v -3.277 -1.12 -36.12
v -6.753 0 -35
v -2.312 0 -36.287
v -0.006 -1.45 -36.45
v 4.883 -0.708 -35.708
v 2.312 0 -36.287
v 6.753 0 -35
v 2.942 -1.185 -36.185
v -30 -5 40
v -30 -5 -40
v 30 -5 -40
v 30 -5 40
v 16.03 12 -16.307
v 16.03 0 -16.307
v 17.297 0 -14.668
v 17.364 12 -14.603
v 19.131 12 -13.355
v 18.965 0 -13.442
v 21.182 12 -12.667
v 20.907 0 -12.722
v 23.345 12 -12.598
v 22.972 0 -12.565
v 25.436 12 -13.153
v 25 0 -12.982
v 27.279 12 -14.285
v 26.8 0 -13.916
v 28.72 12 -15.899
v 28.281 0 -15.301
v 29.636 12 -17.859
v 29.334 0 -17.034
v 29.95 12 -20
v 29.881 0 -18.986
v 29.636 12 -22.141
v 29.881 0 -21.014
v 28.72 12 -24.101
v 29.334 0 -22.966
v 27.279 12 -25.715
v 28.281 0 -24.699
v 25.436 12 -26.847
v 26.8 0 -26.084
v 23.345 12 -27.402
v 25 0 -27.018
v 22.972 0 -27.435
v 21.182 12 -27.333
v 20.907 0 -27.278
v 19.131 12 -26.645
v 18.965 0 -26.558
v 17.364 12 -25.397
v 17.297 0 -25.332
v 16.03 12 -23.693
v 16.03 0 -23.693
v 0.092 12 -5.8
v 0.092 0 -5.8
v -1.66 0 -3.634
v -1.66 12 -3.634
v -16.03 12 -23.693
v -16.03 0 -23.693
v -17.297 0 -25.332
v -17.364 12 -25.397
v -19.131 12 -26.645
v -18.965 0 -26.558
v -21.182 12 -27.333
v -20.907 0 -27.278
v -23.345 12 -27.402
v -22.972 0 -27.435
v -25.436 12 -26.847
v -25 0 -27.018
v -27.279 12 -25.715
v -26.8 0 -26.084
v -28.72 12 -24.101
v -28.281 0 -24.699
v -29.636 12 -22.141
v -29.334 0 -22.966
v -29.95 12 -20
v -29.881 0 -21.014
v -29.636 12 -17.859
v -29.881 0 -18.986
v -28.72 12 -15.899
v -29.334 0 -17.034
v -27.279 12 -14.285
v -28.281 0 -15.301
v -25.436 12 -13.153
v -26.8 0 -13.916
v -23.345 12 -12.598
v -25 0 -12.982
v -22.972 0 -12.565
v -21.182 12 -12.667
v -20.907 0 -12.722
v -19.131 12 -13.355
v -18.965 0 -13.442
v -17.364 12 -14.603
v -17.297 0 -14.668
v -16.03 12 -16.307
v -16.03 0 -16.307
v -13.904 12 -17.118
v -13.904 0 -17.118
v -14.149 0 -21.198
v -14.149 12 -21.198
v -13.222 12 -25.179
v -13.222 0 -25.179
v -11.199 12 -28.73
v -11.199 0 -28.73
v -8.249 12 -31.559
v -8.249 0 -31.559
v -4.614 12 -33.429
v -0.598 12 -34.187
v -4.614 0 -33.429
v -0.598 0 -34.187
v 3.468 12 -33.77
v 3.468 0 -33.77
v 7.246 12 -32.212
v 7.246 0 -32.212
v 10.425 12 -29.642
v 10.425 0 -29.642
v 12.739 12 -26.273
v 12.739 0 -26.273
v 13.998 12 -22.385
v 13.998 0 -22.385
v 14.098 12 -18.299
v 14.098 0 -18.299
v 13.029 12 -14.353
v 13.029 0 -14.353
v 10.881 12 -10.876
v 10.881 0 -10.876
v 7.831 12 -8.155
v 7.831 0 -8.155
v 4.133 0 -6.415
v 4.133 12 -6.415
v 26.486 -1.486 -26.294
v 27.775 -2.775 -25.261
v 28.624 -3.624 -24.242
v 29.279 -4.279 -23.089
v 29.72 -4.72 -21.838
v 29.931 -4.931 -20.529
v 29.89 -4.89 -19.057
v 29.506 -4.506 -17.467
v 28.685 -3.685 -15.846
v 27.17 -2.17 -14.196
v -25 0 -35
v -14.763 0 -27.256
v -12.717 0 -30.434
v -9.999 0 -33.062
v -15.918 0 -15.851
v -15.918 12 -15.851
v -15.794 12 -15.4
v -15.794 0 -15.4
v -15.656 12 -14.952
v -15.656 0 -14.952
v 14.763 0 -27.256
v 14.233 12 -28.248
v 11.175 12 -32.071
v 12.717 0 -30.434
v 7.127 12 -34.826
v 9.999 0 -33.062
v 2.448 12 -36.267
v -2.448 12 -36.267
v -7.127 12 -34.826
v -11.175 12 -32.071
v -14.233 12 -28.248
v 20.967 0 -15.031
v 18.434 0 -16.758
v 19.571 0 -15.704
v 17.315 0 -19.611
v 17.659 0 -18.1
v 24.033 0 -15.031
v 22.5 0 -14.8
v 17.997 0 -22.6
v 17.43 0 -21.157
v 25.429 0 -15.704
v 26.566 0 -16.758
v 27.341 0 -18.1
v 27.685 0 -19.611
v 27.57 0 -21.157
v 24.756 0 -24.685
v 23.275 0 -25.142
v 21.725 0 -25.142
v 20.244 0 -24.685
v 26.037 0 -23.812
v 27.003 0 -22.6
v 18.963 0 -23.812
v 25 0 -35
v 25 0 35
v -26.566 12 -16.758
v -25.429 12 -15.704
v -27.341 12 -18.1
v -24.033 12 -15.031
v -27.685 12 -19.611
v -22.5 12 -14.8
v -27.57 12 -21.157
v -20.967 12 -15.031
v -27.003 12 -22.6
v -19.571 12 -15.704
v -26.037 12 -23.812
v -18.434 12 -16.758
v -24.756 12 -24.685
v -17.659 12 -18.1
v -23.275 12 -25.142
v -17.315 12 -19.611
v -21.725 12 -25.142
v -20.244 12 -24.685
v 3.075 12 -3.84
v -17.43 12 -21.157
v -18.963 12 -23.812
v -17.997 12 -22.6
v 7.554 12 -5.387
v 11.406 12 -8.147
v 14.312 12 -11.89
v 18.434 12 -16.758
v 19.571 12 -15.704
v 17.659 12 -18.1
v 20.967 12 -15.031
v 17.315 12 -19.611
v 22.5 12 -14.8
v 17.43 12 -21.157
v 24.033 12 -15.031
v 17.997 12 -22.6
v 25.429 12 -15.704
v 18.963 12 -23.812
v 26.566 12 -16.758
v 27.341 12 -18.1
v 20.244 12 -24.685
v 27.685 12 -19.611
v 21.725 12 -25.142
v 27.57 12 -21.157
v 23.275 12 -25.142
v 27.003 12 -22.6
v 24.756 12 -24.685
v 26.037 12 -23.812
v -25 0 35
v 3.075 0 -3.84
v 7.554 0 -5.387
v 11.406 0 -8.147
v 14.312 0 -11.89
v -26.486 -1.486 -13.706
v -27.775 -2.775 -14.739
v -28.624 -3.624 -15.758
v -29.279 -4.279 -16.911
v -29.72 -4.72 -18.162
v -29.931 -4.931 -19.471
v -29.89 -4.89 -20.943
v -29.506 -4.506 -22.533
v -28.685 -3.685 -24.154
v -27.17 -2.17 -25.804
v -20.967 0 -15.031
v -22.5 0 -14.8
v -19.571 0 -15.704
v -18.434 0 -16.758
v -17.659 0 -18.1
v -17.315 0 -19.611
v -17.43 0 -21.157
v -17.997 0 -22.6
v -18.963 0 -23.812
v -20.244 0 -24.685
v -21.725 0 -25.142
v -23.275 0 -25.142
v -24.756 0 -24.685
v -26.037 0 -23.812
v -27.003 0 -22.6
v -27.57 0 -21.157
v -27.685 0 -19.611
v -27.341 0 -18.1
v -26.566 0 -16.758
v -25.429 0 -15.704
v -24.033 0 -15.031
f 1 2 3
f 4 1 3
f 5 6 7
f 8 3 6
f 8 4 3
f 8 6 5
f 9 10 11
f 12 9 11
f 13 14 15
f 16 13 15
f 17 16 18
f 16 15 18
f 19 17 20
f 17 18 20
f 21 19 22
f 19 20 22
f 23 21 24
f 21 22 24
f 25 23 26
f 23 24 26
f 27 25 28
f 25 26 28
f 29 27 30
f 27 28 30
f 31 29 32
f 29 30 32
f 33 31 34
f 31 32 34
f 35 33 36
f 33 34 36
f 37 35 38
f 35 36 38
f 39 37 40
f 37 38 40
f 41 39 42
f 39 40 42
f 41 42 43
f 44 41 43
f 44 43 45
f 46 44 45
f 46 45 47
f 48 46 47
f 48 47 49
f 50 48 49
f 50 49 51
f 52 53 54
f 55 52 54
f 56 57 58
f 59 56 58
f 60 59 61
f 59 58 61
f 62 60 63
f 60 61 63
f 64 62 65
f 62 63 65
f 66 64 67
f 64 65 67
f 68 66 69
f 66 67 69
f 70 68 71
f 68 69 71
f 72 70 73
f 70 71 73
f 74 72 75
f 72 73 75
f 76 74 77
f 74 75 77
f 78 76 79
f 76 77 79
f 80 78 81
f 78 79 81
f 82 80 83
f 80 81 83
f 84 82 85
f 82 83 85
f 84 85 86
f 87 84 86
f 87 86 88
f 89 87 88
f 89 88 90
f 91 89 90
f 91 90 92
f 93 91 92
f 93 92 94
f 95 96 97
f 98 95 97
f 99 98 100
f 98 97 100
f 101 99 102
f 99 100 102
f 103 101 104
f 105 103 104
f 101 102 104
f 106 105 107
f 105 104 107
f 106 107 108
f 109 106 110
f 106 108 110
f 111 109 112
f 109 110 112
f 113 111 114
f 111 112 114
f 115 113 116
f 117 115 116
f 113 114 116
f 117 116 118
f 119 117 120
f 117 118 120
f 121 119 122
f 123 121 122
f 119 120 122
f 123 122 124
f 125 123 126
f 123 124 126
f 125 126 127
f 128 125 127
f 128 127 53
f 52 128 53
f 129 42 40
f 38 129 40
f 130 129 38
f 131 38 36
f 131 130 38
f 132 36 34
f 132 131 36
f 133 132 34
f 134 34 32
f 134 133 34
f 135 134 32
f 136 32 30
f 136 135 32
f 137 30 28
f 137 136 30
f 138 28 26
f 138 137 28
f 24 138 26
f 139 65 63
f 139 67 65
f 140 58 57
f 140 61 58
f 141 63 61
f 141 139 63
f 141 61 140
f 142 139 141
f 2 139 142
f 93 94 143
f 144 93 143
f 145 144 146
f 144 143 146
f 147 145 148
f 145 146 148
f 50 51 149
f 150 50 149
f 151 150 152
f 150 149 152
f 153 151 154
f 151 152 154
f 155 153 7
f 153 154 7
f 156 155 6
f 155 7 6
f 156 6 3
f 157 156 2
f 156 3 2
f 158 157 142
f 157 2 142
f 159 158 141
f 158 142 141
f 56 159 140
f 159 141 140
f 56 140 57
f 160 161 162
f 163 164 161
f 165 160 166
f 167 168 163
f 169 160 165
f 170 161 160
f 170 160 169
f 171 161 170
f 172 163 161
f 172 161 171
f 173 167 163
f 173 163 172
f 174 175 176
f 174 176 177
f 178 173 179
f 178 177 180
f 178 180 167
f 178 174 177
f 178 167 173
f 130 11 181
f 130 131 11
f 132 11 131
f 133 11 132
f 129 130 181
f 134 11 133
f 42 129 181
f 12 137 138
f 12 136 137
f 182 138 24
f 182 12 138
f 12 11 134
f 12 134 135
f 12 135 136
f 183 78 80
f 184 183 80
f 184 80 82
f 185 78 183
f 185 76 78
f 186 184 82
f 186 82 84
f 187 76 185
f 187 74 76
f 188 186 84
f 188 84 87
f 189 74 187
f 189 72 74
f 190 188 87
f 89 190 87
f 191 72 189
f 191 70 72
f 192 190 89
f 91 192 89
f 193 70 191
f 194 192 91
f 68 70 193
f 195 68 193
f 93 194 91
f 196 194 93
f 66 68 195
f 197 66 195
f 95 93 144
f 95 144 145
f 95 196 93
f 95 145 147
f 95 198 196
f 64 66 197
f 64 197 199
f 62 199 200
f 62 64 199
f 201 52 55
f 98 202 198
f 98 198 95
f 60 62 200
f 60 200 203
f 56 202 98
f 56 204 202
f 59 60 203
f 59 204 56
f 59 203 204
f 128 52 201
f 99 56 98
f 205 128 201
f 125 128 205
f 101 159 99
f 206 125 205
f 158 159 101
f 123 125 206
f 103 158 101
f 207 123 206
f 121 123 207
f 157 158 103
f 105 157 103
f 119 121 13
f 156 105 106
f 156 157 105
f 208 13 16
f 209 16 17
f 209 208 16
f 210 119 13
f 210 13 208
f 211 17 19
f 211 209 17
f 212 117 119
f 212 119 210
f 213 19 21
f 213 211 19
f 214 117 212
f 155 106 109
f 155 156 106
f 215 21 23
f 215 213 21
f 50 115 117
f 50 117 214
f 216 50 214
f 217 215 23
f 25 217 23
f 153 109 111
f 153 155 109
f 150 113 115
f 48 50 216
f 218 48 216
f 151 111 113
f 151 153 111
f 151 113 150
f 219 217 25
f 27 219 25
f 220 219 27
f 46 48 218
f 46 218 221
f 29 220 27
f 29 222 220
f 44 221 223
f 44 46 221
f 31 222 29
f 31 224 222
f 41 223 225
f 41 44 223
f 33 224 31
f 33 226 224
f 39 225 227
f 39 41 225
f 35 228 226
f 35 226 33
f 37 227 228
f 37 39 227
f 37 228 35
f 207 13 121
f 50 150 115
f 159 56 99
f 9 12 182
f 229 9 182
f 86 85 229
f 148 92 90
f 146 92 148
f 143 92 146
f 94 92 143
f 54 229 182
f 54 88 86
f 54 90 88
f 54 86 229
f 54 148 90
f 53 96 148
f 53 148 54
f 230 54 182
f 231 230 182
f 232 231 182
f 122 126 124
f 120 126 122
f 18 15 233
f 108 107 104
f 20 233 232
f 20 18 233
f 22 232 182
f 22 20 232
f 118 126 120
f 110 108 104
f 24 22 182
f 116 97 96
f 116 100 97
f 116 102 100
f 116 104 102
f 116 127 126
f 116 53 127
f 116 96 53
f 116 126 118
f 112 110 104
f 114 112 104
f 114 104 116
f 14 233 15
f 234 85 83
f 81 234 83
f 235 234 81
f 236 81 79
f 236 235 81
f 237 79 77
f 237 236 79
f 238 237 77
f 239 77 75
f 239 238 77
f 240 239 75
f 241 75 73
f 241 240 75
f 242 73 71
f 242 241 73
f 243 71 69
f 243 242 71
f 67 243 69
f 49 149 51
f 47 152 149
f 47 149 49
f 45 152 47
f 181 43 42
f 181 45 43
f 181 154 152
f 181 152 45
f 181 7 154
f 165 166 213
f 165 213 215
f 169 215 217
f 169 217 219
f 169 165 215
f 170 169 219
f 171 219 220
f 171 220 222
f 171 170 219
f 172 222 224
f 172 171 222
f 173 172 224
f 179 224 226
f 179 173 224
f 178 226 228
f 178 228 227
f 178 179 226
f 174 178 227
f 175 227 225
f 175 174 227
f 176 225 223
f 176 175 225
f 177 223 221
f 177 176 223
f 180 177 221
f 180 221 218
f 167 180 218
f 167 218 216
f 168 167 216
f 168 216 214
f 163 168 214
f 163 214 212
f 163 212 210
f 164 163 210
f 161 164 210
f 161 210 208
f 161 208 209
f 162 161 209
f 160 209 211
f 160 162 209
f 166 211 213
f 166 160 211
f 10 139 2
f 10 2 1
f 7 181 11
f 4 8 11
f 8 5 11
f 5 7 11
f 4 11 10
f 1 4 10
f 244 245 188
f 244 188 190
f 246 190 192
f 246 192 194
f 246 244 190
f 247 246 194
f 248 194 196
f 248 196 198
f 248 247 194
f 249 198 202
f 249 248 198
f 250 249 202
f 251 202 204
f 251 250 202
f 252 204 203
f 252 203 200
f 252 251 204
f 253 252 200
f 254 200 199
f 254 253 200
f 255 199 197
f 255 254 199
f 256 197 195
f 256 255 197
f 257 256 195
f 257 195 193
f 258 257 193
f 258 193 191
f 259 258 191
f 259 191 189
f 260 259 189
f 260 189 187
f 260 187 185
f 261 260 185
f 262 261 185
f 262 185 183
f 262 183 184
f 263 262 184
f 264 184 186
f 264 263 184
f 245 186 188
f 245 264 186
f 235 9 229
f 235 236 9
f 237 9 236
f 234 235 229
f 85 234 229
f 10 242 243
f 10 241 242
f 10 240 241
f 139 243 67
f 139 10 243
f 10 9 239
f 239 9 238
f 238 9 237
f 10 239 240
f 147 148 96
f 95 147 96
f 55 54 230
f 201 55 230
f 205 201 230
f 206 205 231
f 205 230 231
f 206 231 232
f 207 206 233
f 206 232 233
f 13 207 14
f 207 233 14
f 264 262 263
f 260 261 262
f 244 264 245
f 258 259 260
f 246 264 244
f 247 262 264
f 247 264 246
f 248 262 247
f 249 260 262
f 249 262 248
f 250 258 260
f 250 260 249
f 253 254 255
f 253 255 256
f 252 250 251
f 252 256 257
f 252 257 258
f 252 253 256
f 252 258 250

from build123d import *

# Parameters (mm, degrees)
SKETCH1_W           = 60
SKETCH1_H           = 80
BOSS_EXTRUDE2_DEPTH = 5
SKETCH1_7_R         = 5.2
BOSS_EXTRUDE4_DEPTH = 12
CHAMFER1_SIZE       = 5


with BuildPart() as part:
    # Sketch1 → Boss-Extrude2 (new body)
    with BuildSketch(Plane(origin=(0, 0, 0), x_dir=(1, 0, 0), z_dir=(0, 1, 0))):
        Rectangle(SKETCH1_W, SKETCH1_H)
    extrude(amount=-BOSS_EXTRUDE2_DEPTH)

    # Sketch1<7> → Boss-Extrude4 (add)
    with BuildSketch(Plane(origin=(0, 0, 0), x_dir=(1, 0, 0), z_dir=(0, 1, 0))):
        with BuildLine():
            Line((-15.656226575, 14.951726095), (-13.904483467, 17.118101406))
            ThreePointArc((-13.904483467, 17.118101406), (8.928488267, 31.041833963), (0.092207471, 5.800299377))
            Line((0.092207471, 5.800299377), (-1.659535637, 3.633924066))
            ThreePointArc((-1.659535637, 3.633924066), (9.580000014, 6.627412377), (16.03, 16.306546332))
            ThreePointArc((16.03, 16.306546332), (29.95, 20), (16.03, 23.693453668))
            ThreePointArc((16.03, 23.693453668), (0, 36.45), (-16.03, 23.693453668))
            ThreePointArc((-16.03, 23.693453668), (-29.95, 20), (-16.03, 16.306546332))
            ThreePointArc((-16.03, 16.306546332), (-15.857588818, 15.625142644), (-15.656226575, 14.951726095))
        make_face()
        with Locations(Location((-22.5, 20, 0), (0, 0, 270))):
            Circle(SKETCH1_7_R, mode=Mode.SUBTRACT)
        with Locations(Location((22.5, 20, 0), (0, 0, 270))):
            Circle(SKETCH1_7_R, mode=Mode.SUBTRACT)
    extrude(amount=BOSS_EXTRUDE4_DEPTH)

    # Chamfer1
    # the kernel refuses this chamfer: 5 mm, written as the material it takes off along each edge
    with BuildSketch(Plane(origin=(42.85841494, 0, -40), x_dir=(0, 0.027495876610586372, 0.9996219169112968), z_dir=(-1, 0, 0))) as chamfer1_piece_1_section:
        Polygon((CHAMFER1_SIZE * 0.999621916911, -CHAMFER1_SIZE * 0.0274958766106), (-CHAMFER1_SIZE * 0.0274958766106, -CHAMFER1_SIZE * 0.999621916911), (0, 0), align=None)
    chamfer1_piece_1 = extrude(amount=85.71682988, mode=Mode.PRIVATE)
    chamfer1_piece_1 = chamfer1_piece_1 - Plane(origin=(0, -1.679599763, -20), x_dir=(0.9744680851063817, 0, -0.22452605886422566), z_dir=(0, -1, 0)) * Cylinder(16.45, 192, mode=Mode.PRIVATE)
    add(chamfer1_piece_1, mode=Mode.SUBTRACT)
    with BuildSketch(Plane(origin=(30, 0, 52.85841494), x_dir=(0.027495876610586317, -0.9996219169112968, 0), z_dir=(0, 0, -1))) as chamfer1_piece_2_section:
        Polygon((CHAMFER1_SIZE * 0.999621916911, CHAMFER1_SIZE * 0.0274958766106), (-CHAMFER1_SIZE * 0.0274958766106, CHAMFER1_SIZE * 0.999621916911), (0, 0), align=None)
    chamfer1_piece_2 = extrude(amount=105.71682988, mode=Mode.PRIVATE)
    chamfer1_piece_2 = chamfer1_piece_2 - Plane(origin=(22.5, -1.692858266, -20), x_dir=(-0.8684563758389187, 0, 0.49576559306261964), z_dir=(0, -1, 0)) * Cylinder(7.45, 232, mode=Mode.PRIVATE)
    add(chamfer1_piece_2, mode=Mode.SUBTRACT)
    with BuildSketch(Plane(origin=(-42.85841494, 0, 40), x_dir=(0, -0.9996219169112968, 0.027495876610586317), z_dir=(1, 0, 0))) as chamfer1_piece_3:
        Polygon((CHAMFER1_SIZE * 0.999621916911, CHAMFER1_SIZE * 0.0274958766106), (-CHAMFER1_SIZE * 0.0274958766106, CHAMFER1_SIZE * 0.999621916911), (0, 0), align=None)
    extrude(amount=85.71682988, mode=Mode.SUBTRACT)
    with BuildSketch(Plane(origin=(-30, 0, -52.85841494), x_dir=(-0.027495876610586317, -0.9996219169112968, 0), z_dir=(0, 0, 1))) as chamfer1_piece_4_section:
        Polygon((CHAMFER1_SIZE * 0.999621916911, CHAMFER1_SIZE * 0.0274958766106), (-CHAMFER1_SIZE * 0.0274958766106, CHAMFER1_SIZE * 0.999621916911), (0, 0), align=None)
    chamfer1_piece_4 = extrude(amount=105.71682988, mode=Mode.PRIVATE)
    chamfer1_piece_4 = chamfer1_piece_4 - Plane(origin=(-22.5, -1.692858266, -20), x_dir=(0.8684563758389191, 0, -0.4957655930626189), z_dir=(0, -1, 0)) * Cylinder(7.45, 232, mode=Mode.PRIVATE)
    add(chamfer1_piece_4, mode=Mode.SUBTRACT)


solid = part.part
